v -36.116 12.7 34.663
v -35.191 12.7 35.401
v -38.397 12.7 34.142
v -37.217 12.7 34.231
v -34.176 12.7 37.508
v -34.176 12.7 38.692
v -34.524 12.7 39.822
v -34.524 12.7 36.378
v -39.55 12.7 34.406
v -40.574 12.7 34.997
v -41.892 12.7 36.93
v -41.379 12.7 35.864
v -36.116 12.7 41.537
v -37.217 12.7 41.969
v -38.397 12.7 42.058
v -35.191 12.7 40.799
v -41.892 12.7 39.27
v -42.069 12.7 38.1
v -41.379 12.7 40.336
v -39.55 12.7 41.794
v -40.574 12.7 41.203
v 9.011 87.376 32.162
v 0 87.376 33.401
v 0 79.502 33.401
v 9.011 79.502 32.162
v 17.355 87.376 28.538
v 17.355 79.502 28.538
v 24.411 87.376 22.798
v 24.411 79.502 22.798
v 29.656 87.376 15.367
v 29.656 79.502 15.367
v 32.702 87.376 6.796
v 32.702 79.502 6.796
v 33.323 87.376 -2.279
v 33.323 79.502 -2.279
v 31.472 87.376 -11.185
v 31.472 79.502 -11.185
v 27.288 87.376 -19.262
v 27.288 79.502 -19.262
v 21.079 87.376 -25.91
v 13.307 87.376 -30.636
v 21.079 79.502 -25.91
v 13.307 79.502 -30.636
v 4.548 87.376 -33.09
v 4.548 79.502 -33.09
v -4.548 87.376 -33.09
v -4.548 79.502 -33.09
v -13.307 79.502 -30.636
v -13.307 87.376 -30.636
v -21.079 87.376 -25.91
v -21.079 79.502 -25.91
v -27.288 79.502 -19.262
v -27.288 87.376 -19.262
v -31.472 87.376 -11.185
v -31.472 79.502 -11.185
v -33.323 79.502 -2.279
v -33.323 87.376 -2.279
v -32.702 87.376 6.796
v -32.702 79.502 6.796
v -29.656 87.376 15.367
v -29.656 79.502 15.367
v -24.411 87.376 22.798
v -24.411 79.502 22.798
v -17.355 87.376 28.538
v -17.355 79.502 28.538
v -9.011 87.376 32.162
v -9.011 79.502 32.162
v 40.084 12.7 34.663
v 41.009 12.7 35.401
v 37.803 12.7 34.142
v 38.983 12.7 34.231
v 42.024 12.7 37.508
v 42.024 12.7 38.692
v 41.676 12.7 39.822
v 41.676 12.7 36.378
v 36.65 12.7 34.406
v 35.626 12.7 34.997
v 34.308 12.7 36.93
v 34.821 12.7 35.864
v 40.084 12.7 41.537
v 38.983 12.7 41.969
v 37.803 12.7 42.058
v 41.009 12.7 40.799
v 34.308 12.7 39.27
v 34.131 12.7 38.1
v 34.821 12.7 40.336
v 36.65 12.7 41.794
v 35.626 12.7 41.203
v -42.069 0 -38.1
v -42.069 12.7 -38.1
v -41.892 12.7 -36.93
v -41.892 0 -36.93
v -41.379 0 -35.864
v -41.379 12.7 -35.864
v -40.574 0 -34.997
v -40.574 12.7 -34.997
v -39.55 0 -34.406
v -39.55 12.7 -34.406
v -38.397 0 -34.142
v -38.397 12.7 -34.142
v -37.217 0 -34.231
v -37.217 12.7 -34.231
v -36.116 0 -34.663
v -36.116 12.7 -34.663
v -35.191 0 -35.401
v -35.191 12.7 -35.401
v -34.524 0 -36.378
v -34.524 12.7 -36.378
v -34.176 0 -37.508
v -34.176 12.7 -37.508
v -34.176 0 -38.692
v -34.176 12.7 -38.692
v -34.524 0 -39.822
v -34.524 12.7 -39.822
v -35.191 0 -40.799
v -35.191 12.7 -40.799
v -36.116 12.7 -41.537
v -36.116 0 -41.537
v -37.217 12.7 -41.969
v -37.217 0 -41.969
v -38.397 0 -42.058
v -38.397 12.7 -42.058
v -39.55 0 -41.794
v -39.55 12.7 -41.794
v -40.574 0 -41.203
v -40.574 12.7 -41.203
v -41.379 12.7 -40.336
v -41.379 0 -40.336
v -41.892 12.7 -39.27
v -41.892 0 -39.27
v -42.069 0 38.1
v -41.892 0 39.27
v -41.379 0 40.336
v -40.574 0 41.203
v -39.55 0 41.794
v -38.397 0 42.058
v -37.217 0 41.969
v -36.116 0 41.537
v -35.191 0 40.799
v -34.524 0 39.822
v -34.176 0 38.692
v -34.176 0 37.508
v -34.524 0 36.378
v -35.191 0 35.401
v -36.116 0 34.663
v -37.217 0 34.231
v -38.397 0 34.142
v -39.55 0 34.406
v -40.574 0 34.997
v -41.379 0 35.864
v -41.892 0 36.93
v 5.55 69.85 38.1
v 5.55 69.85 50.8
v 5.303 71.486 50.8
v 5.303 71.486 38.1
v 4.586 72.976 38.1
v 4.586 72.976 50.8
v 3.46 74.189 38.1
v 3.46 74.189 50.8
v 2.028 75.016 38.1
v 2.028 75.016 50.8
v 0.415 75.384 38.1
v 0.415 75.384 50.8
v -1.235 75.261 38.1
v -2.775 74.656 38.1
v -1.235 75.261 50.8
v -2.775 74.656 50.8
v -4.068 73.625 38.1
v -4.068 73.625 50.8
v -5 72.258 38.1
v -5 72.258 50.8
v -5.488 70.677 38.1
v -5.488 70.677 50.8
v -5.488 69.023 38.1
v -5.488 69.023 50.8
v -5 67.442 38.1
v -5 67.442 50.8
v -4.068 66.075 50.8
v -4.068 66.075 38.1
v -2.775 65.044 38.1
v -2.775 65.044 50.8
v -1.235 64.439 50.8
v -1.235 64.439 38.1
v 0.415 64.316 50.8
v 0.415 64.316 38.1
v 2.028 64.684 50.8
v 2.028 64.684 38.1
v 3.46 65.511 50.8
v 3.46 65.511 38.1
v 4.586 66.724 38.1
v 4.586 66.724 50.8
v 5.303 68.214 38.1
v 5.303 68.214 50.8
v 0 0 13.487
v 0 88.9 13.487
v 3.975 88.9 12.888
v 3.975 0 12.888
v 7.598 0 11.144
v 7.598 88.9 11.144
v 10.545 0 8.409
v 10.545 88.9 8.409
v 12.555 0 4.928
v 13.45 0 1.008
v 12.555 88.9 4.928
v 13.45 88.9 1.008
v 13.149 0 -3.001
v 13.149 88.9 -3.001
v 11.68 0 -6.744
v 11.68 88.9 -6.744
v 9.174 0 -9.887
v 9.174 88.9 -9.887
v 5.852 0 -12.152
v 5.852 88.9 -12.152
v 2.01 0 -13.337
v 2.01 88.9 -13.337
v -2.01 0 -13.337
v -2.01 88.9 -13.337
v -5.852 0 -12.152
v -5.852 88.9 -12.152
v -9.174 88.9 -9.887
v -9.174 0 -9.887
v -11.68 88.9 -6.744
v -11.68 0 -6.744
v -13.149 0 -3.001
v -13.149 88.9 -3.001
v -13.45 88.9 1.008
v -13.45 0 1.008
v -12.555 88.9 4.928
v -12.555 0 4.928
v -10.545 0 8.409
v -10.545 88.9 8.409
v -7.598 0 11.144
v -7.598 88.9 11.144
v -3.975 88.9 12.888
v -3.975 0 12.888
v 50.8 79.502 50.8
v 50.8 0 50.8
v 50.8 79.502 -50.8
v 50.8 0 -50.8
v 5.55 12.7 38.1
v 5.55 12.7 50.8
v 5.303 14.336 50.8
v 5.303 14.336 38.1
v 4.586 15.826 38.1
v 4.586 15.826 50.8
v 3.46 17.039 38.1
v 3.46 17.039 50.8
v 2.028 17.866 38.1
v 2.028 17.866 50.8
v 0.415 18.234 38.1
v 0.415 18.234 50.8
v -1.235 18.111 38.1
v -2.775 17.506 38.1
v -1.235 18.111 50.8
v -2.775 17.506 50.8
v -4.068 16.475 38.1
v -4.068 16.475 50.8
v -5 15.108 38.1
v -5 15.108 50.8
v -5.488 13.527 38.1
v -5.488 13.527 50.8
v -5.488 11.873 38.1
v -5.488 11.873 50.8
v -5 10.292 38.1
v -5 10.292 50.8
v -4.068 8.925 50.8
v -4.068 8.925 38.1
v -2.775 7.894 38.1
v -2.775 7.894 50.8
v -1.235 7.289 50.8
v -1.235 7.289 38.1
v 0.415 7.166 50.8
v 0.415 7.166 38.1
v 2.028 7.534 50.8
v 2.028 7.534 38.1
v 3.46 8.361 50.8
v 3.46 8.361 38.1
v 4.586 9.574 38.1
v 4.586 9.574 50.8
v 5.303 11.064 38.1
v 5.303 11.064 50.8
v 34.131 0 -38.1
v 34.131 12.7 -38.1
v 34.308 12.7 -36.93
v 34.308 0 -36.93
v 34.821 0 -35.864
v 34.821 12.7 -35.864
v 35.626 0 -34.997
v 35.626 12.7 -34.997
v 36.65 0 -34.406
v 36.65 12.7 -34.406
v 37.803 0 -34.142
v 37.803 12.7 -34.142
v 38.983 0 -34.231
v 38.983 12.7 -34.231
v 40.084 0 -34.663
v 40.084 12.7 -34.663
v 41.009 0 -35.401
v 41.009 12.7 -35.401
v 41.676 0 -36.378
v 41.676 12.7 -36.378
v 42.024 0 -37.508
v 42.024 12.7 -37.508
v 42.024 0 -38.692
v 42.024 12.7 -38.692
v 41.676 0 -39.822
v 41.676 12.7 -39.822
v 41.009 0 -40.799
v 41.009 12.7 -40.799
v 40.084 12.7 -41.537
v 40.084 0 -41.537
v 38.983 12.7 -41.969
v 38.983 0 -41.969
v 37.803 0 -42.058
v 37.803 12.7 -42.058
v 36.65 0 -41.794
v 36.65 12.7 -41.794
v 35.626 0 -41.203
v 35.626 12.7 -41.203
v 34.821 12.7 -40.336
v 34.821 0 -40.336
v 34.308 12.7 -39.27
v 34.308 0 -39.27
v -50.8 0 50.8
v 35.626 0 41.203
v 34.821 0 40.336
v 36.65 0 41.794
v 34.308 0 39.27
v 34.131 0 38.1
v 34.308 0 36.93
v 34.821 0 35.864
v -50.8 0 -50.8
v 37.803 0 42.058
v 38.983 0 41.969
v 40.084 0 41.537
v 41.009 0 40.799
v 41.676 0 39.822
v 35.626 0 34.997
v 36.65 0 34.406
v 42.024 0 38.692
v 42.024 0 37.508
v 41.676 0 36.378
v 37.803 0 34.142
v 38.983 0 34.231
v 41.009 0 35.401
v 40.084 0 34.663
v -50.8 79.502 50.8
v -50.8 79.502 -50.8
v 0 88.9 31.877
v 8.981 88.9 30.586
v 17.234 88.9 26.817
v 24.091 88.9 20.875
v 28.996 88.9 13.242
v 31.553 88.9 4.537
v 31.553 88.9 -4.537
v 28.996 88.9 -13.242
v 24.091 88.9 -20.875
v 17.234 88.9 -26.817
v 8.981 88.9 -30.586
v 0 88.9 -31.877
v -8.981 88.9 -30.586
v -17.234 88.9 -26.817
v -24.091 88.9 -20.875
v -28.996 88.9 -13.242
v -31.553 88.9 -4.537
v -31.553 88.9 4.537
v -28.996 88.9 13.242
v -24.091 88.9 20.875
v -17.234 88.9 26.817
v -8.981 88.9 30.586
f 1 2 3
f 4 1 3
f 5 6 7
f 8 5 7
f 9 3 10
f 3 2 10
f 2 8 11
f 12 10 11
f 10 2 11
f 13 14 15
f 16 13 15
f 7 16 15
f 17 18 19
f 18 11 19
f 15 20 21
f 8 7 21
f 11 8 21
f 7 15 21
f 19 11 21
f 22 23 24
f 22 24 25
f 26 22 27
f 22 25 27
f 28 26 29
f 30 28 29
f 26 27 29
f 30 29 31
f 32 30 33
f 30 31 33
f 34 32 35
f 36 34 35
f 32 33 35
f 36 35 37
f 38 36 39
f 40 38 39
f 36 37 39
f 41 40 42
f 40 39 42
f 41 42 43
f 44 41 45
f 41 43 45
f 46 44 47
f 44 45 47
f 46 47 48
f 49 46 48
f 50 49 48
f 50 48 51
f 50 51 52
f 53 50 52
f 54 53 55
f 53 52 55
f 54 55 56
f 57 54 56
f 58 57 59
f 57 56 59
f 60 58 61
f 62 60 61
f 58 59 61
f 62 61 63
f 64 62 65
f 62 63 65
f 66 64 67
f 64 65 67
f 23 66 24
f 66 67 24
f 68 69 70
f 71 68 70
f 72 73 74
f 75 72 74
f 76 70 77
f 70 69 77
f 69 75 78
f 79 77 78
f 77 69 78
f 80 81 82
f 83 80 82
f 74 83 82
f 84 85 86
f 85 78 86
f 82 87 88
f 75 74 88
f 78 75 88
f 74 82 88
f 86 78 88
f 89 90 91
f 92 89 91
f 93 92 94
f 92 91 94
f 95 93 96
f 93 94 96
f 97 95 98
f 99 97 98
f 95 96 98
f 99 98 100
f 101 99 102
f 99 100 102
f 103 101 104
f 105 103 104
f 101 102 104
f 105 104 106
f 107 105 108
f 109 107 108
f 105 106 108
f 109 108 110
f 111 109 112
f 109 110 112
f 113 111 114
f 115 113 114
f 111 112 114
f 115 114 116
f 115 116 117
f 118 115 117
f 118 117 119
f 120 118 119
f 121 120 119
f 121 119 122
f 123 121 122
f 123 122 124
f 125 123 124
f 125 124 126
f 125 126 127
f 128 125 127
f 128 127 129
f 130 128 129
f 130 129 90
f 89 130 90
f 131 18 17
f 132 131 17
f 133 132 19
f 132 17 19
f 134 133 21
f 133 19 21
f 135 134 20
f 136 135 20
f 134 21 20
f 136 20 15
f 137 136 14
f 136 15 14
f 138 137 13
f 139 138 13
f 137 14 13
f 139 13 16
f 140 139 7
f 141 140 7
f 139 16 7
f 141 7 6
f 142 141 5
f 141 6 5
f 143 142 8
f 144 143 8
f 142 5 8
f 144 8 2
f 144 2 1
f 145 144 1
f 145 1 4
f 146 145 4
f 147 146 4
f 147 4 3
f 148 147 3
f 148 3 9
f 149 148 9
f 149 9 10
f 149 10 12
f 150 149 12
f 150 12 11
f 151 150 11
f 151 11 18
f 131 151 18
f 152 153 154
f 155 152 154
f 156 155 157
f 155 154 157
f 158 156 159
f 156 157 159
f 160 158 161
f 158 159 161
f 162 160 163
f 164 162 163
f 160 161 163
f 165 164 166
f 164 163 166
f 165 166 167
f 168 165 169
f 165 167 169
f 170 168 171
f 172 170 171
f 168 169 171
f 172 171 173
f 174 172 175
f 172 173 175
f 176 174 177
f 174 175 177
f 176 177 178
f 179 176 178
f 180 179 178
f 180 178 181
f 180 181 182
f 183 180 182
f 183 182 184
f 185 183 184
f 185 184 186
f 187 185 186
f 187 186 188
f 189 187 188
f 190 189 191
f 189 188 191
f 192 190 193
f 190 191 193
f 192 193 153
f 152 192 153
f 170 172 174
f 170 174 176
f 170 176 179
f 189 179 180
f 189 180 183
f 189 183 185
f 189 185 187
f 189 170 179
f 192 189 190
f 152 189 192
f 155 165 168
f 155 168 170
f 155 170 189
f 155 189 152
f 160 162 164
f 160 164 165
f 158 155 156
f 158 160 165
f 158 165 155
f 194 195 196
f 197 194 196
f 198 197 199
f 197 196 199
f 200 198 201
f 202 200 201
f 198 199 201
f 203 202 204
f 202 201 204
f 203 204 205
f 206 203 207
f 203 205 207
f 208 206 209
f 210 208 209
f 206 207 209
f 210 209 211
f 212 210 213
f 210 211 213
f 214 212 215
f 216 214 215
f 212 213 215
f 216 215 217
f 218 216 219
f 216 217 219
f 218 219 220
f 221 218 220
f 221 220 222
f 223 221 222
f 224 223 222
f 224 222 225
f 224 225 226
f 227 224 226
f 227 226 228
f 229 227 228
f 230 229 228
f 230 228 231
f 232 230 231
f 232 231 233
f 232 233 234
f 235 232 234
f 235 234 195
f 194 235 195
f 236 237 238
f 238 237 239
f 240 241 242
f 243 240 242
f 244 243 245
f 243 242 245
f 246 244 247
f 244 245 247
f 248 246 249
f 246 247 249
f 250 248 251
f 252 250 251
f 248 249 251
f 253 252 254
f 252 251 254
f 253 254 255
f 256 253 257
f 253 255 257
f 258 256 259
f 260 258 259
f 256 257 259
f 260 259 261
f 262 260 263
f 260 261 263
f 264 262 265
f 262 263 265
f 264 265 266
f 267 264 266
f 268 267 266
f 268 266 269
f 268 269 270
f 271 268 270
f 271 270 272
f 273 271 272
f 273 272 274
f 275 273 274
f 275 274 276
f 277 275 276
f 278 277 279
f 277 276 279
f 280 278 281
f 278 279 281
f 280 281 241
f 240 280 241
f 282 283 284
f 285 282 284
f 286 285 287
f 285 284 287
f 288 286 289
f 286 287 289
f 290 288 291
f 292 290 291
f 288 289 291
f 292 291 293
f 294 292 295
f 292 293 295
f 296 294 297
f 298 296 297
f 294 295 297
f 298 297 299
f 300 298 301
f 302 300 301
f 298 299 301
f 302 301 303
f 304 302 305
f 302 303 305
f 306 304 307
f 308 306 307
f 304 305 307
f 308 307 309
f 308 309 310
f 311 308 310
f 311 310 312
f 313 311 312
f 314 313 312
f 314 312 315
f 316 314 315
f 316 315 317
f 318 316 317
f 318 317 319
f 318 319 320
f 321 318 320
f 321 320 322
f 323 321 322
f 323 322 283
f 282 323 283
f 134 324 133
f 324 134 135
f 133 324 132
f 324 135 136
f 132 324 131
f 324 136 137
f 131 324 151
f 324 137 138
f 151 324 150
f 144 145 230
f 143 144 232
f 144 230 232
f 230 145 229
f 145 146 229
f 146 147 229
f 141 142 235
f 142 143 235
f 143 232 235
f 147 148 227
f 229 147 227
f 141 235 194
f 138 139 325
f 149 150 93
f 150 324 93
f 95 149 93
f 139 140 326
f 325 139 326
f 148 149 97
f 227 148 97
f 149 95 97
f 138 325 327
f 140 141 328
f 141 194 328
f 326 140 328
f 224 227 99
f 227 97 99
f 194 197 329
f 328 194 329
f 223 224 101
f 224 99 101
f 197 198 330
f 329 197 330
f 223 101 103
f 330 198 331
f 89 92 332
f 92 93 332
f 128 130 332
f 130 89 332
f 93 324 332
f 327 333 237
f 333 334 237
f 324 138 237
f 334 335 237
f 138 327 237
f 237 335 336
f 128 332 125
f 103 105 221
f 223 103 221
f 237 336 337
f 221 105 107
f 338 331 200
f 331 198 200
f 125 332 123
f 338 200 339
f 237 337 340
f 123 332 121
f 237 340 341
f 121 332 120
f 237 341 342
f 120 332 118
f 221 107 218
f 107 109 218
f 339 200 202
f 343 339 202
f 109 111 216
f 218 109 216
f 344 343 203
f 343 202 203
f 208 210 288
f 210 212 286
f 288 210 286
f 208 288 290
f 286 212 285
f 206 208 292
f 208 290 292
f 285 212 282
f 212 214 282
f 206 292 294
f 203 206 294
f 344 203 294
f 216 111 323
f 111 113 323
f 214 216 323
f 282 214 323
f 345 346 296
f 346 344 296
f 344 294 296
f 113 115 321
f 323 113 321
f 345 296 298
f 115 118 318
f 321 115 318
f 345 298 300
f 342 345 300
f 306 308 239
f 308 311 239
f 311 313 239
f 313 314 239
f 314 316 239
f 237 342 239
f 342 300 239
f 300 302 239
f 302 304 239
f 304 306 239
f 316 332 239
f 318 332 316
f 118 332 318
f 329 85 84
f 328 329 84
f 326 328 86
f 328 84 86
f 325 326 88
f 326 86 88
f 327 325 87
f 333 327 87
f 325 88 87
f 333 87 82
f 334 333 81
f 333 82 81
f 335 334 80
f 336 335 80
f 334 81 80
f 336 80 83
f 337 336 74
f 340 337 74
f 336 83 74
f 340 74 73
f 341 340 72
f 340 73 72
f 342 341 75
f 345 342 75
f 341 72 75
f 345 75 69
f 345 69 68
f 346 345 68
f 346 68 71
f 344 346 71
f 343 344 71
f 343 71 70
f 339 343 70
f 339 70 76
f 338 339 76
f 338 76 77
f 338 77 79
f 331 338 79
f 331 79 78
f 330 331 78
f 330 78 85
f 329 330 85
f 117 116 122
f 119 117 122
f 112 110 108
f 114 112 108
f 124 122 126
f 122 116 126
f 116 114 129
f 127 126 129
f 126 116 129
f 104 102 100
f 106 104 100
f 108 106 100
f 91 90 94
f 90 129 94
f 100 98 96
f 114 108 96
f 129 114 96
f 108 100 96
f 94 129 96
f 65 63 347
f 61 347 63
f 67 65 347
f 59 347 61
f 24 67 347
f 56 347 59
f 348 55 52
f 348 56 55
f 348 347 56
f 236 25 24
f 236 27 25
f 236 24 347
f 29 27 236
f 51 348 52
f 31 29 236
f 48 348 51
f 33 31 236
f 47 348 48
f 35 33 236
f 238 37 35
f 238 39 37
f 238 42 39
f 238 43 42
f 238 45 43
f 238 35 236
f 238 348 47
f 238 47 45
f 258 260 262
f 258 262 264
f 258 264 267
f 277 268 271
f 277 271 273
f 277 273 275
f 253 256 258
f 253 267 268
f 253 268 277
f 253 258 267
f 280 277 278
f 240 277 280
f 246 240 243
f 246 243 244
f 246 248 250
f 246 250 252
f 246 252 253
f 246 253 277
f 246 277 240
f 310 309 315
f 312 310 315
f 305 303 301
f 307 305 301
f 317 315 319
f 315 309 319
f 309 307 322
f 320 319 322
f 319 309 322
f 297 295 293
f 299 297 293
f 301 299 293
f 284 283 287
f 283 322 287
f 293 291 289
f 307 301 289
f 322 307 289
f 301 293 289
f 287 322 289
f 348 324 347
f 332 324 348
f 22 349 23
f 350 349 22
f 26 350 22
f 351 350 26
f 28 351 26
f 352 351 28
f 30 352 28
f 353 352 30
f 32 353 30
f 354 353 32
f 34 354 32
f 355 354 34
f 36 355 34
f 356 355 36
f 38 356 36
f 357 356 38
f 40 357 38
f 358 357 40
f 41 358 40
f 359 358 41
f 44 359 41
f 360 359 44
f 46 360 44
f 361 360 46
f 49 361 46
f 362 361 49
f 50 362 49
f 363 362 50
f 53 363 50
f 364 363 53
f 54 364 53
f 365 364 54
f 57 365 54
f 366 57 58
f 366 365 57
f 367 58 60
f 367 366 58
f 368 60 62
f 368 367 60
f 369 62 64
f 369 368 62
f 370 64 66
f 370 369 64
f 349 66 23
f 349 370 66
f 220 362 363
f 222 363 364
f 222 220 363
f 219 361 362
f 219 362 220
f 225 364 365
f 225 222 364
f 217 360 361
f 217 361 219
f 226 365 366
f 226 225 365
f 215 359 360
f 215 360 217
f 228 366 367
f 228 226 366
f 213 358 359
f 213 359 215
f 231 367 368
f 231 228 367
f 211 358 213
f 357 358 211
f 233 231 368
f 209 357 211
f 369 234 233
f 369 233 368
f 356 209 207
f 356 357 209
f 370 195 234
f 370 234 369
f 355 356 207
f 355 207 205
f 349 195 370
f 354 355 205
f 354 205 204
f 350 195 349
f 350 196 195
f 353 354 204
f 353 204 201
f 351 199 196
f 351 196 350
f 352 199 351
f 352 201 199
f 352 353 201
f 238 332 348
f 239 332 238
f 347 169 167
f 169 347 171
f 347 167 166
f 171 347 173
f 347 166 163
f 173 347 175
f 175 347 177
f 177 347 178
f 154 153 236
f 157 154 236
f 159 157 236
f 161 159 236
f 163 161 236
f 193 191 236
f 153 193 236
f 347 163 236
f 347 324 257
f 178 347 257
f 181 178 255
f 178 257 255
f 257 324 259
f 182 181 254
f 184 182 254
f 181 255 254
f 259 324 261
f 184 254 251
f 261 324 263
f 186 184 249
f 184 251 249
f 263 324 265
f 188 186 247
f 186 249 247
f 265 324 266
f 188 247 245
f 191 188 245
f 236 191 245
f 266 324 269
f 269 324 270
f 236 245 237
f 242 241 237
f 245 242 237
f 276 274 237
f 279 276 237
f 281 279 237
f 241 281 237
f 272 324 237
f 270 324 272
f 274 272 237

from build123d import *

# Parameters (mm, degrees)
SKETCH1_W          = 101.6
SKETCH1_H          = 101.6
EXTRUDE1_DEPTH     = 79.502
SKETCH2_R          = 33.401
EXTRUDE2_DEPTH     = 9.398
CHAMFER1_SIZE      = 1.524
SKETCH3_R          = 13.4874
CUT_EXTRUDE1_DEPTH = 89.9
SKETCH4_R          = 5.5499
CUT_EXTRUDE2_DEPTH = 12.7
HOLE1_D            = 7.9375
HOLE1_DEPTH        = 12.7


with BuildPart() as part:
    # Sketch1 → Extrude1 (new body)
    with BuildSketch(Plane(origin=(0, 0, 0), x_dir=(1, 0, 0), z_dir=(0, 1, 0))):
        Rectangle(SKETCH1_W, SKETCH1_H)
    extrude(amount=EXTRUDE1_DEPTH)

    # Sketch2 → Extrude2 (add)
    with BuildSketch(Plane(origin=(0, 79.502, 0), x_dir=(-1, 0, 0), z_dir=(0, 1, 0))):
        with Locations(Location((0, 0, 0), (0, 0, 90))):  # turned: the seam where the file's is
            Circle(SKETCH2_R)
    extrude(amount=EXTRUDE2_DEPTH)

    # Chamfer1
    chamfer1_edges = [part.edges().sort_by_distance(p)[0] for p in [
        (0, 88.9, -33.401),
    ]]
    chamfer(chamfer1_edges, length=CHAMFER1_SIZE)

    # Sketch3 → Cut-Extrude1 (cut, through all)
    with BuildSketch(Plane(origin=(0, 88.9, 0), x_dir=(1, 0, 0), z_dir=(0, 1, 0))):
        with Locations(Location((0, 0, 0), (0, 0, 270))):  # turned: the seam where the file's is
            Circle(SKETCH3_R)
    extrude(amount=-CUT_EXTRUDE1_DEPTH, mode=Mode.SUBTRACT)

    # Sketch4 → Cut-Extrude2 (cut)
    with BuildSketch(Plane.XY.offset(50.8)):
        with Locations((0, 69.85)):
            Circle(SKETCH4_R)
        with Locations((0, 12.7)):
            Circle(SKETCH4_R)
    extrude(amount=-CUT_EXTRUDE2_DEPTH, mode=Mode.SUBTRACT)

    # Hole1
    with Locations(Plane.XZ):
        with Locations((-38.1, 38.1), (38.1, 38.1), (38.1, -38.1), (-38.1, -38.1)):
            Hole(HOLE1_D / 2, depth=HOLE1_DEPTH)


solid = part.part
